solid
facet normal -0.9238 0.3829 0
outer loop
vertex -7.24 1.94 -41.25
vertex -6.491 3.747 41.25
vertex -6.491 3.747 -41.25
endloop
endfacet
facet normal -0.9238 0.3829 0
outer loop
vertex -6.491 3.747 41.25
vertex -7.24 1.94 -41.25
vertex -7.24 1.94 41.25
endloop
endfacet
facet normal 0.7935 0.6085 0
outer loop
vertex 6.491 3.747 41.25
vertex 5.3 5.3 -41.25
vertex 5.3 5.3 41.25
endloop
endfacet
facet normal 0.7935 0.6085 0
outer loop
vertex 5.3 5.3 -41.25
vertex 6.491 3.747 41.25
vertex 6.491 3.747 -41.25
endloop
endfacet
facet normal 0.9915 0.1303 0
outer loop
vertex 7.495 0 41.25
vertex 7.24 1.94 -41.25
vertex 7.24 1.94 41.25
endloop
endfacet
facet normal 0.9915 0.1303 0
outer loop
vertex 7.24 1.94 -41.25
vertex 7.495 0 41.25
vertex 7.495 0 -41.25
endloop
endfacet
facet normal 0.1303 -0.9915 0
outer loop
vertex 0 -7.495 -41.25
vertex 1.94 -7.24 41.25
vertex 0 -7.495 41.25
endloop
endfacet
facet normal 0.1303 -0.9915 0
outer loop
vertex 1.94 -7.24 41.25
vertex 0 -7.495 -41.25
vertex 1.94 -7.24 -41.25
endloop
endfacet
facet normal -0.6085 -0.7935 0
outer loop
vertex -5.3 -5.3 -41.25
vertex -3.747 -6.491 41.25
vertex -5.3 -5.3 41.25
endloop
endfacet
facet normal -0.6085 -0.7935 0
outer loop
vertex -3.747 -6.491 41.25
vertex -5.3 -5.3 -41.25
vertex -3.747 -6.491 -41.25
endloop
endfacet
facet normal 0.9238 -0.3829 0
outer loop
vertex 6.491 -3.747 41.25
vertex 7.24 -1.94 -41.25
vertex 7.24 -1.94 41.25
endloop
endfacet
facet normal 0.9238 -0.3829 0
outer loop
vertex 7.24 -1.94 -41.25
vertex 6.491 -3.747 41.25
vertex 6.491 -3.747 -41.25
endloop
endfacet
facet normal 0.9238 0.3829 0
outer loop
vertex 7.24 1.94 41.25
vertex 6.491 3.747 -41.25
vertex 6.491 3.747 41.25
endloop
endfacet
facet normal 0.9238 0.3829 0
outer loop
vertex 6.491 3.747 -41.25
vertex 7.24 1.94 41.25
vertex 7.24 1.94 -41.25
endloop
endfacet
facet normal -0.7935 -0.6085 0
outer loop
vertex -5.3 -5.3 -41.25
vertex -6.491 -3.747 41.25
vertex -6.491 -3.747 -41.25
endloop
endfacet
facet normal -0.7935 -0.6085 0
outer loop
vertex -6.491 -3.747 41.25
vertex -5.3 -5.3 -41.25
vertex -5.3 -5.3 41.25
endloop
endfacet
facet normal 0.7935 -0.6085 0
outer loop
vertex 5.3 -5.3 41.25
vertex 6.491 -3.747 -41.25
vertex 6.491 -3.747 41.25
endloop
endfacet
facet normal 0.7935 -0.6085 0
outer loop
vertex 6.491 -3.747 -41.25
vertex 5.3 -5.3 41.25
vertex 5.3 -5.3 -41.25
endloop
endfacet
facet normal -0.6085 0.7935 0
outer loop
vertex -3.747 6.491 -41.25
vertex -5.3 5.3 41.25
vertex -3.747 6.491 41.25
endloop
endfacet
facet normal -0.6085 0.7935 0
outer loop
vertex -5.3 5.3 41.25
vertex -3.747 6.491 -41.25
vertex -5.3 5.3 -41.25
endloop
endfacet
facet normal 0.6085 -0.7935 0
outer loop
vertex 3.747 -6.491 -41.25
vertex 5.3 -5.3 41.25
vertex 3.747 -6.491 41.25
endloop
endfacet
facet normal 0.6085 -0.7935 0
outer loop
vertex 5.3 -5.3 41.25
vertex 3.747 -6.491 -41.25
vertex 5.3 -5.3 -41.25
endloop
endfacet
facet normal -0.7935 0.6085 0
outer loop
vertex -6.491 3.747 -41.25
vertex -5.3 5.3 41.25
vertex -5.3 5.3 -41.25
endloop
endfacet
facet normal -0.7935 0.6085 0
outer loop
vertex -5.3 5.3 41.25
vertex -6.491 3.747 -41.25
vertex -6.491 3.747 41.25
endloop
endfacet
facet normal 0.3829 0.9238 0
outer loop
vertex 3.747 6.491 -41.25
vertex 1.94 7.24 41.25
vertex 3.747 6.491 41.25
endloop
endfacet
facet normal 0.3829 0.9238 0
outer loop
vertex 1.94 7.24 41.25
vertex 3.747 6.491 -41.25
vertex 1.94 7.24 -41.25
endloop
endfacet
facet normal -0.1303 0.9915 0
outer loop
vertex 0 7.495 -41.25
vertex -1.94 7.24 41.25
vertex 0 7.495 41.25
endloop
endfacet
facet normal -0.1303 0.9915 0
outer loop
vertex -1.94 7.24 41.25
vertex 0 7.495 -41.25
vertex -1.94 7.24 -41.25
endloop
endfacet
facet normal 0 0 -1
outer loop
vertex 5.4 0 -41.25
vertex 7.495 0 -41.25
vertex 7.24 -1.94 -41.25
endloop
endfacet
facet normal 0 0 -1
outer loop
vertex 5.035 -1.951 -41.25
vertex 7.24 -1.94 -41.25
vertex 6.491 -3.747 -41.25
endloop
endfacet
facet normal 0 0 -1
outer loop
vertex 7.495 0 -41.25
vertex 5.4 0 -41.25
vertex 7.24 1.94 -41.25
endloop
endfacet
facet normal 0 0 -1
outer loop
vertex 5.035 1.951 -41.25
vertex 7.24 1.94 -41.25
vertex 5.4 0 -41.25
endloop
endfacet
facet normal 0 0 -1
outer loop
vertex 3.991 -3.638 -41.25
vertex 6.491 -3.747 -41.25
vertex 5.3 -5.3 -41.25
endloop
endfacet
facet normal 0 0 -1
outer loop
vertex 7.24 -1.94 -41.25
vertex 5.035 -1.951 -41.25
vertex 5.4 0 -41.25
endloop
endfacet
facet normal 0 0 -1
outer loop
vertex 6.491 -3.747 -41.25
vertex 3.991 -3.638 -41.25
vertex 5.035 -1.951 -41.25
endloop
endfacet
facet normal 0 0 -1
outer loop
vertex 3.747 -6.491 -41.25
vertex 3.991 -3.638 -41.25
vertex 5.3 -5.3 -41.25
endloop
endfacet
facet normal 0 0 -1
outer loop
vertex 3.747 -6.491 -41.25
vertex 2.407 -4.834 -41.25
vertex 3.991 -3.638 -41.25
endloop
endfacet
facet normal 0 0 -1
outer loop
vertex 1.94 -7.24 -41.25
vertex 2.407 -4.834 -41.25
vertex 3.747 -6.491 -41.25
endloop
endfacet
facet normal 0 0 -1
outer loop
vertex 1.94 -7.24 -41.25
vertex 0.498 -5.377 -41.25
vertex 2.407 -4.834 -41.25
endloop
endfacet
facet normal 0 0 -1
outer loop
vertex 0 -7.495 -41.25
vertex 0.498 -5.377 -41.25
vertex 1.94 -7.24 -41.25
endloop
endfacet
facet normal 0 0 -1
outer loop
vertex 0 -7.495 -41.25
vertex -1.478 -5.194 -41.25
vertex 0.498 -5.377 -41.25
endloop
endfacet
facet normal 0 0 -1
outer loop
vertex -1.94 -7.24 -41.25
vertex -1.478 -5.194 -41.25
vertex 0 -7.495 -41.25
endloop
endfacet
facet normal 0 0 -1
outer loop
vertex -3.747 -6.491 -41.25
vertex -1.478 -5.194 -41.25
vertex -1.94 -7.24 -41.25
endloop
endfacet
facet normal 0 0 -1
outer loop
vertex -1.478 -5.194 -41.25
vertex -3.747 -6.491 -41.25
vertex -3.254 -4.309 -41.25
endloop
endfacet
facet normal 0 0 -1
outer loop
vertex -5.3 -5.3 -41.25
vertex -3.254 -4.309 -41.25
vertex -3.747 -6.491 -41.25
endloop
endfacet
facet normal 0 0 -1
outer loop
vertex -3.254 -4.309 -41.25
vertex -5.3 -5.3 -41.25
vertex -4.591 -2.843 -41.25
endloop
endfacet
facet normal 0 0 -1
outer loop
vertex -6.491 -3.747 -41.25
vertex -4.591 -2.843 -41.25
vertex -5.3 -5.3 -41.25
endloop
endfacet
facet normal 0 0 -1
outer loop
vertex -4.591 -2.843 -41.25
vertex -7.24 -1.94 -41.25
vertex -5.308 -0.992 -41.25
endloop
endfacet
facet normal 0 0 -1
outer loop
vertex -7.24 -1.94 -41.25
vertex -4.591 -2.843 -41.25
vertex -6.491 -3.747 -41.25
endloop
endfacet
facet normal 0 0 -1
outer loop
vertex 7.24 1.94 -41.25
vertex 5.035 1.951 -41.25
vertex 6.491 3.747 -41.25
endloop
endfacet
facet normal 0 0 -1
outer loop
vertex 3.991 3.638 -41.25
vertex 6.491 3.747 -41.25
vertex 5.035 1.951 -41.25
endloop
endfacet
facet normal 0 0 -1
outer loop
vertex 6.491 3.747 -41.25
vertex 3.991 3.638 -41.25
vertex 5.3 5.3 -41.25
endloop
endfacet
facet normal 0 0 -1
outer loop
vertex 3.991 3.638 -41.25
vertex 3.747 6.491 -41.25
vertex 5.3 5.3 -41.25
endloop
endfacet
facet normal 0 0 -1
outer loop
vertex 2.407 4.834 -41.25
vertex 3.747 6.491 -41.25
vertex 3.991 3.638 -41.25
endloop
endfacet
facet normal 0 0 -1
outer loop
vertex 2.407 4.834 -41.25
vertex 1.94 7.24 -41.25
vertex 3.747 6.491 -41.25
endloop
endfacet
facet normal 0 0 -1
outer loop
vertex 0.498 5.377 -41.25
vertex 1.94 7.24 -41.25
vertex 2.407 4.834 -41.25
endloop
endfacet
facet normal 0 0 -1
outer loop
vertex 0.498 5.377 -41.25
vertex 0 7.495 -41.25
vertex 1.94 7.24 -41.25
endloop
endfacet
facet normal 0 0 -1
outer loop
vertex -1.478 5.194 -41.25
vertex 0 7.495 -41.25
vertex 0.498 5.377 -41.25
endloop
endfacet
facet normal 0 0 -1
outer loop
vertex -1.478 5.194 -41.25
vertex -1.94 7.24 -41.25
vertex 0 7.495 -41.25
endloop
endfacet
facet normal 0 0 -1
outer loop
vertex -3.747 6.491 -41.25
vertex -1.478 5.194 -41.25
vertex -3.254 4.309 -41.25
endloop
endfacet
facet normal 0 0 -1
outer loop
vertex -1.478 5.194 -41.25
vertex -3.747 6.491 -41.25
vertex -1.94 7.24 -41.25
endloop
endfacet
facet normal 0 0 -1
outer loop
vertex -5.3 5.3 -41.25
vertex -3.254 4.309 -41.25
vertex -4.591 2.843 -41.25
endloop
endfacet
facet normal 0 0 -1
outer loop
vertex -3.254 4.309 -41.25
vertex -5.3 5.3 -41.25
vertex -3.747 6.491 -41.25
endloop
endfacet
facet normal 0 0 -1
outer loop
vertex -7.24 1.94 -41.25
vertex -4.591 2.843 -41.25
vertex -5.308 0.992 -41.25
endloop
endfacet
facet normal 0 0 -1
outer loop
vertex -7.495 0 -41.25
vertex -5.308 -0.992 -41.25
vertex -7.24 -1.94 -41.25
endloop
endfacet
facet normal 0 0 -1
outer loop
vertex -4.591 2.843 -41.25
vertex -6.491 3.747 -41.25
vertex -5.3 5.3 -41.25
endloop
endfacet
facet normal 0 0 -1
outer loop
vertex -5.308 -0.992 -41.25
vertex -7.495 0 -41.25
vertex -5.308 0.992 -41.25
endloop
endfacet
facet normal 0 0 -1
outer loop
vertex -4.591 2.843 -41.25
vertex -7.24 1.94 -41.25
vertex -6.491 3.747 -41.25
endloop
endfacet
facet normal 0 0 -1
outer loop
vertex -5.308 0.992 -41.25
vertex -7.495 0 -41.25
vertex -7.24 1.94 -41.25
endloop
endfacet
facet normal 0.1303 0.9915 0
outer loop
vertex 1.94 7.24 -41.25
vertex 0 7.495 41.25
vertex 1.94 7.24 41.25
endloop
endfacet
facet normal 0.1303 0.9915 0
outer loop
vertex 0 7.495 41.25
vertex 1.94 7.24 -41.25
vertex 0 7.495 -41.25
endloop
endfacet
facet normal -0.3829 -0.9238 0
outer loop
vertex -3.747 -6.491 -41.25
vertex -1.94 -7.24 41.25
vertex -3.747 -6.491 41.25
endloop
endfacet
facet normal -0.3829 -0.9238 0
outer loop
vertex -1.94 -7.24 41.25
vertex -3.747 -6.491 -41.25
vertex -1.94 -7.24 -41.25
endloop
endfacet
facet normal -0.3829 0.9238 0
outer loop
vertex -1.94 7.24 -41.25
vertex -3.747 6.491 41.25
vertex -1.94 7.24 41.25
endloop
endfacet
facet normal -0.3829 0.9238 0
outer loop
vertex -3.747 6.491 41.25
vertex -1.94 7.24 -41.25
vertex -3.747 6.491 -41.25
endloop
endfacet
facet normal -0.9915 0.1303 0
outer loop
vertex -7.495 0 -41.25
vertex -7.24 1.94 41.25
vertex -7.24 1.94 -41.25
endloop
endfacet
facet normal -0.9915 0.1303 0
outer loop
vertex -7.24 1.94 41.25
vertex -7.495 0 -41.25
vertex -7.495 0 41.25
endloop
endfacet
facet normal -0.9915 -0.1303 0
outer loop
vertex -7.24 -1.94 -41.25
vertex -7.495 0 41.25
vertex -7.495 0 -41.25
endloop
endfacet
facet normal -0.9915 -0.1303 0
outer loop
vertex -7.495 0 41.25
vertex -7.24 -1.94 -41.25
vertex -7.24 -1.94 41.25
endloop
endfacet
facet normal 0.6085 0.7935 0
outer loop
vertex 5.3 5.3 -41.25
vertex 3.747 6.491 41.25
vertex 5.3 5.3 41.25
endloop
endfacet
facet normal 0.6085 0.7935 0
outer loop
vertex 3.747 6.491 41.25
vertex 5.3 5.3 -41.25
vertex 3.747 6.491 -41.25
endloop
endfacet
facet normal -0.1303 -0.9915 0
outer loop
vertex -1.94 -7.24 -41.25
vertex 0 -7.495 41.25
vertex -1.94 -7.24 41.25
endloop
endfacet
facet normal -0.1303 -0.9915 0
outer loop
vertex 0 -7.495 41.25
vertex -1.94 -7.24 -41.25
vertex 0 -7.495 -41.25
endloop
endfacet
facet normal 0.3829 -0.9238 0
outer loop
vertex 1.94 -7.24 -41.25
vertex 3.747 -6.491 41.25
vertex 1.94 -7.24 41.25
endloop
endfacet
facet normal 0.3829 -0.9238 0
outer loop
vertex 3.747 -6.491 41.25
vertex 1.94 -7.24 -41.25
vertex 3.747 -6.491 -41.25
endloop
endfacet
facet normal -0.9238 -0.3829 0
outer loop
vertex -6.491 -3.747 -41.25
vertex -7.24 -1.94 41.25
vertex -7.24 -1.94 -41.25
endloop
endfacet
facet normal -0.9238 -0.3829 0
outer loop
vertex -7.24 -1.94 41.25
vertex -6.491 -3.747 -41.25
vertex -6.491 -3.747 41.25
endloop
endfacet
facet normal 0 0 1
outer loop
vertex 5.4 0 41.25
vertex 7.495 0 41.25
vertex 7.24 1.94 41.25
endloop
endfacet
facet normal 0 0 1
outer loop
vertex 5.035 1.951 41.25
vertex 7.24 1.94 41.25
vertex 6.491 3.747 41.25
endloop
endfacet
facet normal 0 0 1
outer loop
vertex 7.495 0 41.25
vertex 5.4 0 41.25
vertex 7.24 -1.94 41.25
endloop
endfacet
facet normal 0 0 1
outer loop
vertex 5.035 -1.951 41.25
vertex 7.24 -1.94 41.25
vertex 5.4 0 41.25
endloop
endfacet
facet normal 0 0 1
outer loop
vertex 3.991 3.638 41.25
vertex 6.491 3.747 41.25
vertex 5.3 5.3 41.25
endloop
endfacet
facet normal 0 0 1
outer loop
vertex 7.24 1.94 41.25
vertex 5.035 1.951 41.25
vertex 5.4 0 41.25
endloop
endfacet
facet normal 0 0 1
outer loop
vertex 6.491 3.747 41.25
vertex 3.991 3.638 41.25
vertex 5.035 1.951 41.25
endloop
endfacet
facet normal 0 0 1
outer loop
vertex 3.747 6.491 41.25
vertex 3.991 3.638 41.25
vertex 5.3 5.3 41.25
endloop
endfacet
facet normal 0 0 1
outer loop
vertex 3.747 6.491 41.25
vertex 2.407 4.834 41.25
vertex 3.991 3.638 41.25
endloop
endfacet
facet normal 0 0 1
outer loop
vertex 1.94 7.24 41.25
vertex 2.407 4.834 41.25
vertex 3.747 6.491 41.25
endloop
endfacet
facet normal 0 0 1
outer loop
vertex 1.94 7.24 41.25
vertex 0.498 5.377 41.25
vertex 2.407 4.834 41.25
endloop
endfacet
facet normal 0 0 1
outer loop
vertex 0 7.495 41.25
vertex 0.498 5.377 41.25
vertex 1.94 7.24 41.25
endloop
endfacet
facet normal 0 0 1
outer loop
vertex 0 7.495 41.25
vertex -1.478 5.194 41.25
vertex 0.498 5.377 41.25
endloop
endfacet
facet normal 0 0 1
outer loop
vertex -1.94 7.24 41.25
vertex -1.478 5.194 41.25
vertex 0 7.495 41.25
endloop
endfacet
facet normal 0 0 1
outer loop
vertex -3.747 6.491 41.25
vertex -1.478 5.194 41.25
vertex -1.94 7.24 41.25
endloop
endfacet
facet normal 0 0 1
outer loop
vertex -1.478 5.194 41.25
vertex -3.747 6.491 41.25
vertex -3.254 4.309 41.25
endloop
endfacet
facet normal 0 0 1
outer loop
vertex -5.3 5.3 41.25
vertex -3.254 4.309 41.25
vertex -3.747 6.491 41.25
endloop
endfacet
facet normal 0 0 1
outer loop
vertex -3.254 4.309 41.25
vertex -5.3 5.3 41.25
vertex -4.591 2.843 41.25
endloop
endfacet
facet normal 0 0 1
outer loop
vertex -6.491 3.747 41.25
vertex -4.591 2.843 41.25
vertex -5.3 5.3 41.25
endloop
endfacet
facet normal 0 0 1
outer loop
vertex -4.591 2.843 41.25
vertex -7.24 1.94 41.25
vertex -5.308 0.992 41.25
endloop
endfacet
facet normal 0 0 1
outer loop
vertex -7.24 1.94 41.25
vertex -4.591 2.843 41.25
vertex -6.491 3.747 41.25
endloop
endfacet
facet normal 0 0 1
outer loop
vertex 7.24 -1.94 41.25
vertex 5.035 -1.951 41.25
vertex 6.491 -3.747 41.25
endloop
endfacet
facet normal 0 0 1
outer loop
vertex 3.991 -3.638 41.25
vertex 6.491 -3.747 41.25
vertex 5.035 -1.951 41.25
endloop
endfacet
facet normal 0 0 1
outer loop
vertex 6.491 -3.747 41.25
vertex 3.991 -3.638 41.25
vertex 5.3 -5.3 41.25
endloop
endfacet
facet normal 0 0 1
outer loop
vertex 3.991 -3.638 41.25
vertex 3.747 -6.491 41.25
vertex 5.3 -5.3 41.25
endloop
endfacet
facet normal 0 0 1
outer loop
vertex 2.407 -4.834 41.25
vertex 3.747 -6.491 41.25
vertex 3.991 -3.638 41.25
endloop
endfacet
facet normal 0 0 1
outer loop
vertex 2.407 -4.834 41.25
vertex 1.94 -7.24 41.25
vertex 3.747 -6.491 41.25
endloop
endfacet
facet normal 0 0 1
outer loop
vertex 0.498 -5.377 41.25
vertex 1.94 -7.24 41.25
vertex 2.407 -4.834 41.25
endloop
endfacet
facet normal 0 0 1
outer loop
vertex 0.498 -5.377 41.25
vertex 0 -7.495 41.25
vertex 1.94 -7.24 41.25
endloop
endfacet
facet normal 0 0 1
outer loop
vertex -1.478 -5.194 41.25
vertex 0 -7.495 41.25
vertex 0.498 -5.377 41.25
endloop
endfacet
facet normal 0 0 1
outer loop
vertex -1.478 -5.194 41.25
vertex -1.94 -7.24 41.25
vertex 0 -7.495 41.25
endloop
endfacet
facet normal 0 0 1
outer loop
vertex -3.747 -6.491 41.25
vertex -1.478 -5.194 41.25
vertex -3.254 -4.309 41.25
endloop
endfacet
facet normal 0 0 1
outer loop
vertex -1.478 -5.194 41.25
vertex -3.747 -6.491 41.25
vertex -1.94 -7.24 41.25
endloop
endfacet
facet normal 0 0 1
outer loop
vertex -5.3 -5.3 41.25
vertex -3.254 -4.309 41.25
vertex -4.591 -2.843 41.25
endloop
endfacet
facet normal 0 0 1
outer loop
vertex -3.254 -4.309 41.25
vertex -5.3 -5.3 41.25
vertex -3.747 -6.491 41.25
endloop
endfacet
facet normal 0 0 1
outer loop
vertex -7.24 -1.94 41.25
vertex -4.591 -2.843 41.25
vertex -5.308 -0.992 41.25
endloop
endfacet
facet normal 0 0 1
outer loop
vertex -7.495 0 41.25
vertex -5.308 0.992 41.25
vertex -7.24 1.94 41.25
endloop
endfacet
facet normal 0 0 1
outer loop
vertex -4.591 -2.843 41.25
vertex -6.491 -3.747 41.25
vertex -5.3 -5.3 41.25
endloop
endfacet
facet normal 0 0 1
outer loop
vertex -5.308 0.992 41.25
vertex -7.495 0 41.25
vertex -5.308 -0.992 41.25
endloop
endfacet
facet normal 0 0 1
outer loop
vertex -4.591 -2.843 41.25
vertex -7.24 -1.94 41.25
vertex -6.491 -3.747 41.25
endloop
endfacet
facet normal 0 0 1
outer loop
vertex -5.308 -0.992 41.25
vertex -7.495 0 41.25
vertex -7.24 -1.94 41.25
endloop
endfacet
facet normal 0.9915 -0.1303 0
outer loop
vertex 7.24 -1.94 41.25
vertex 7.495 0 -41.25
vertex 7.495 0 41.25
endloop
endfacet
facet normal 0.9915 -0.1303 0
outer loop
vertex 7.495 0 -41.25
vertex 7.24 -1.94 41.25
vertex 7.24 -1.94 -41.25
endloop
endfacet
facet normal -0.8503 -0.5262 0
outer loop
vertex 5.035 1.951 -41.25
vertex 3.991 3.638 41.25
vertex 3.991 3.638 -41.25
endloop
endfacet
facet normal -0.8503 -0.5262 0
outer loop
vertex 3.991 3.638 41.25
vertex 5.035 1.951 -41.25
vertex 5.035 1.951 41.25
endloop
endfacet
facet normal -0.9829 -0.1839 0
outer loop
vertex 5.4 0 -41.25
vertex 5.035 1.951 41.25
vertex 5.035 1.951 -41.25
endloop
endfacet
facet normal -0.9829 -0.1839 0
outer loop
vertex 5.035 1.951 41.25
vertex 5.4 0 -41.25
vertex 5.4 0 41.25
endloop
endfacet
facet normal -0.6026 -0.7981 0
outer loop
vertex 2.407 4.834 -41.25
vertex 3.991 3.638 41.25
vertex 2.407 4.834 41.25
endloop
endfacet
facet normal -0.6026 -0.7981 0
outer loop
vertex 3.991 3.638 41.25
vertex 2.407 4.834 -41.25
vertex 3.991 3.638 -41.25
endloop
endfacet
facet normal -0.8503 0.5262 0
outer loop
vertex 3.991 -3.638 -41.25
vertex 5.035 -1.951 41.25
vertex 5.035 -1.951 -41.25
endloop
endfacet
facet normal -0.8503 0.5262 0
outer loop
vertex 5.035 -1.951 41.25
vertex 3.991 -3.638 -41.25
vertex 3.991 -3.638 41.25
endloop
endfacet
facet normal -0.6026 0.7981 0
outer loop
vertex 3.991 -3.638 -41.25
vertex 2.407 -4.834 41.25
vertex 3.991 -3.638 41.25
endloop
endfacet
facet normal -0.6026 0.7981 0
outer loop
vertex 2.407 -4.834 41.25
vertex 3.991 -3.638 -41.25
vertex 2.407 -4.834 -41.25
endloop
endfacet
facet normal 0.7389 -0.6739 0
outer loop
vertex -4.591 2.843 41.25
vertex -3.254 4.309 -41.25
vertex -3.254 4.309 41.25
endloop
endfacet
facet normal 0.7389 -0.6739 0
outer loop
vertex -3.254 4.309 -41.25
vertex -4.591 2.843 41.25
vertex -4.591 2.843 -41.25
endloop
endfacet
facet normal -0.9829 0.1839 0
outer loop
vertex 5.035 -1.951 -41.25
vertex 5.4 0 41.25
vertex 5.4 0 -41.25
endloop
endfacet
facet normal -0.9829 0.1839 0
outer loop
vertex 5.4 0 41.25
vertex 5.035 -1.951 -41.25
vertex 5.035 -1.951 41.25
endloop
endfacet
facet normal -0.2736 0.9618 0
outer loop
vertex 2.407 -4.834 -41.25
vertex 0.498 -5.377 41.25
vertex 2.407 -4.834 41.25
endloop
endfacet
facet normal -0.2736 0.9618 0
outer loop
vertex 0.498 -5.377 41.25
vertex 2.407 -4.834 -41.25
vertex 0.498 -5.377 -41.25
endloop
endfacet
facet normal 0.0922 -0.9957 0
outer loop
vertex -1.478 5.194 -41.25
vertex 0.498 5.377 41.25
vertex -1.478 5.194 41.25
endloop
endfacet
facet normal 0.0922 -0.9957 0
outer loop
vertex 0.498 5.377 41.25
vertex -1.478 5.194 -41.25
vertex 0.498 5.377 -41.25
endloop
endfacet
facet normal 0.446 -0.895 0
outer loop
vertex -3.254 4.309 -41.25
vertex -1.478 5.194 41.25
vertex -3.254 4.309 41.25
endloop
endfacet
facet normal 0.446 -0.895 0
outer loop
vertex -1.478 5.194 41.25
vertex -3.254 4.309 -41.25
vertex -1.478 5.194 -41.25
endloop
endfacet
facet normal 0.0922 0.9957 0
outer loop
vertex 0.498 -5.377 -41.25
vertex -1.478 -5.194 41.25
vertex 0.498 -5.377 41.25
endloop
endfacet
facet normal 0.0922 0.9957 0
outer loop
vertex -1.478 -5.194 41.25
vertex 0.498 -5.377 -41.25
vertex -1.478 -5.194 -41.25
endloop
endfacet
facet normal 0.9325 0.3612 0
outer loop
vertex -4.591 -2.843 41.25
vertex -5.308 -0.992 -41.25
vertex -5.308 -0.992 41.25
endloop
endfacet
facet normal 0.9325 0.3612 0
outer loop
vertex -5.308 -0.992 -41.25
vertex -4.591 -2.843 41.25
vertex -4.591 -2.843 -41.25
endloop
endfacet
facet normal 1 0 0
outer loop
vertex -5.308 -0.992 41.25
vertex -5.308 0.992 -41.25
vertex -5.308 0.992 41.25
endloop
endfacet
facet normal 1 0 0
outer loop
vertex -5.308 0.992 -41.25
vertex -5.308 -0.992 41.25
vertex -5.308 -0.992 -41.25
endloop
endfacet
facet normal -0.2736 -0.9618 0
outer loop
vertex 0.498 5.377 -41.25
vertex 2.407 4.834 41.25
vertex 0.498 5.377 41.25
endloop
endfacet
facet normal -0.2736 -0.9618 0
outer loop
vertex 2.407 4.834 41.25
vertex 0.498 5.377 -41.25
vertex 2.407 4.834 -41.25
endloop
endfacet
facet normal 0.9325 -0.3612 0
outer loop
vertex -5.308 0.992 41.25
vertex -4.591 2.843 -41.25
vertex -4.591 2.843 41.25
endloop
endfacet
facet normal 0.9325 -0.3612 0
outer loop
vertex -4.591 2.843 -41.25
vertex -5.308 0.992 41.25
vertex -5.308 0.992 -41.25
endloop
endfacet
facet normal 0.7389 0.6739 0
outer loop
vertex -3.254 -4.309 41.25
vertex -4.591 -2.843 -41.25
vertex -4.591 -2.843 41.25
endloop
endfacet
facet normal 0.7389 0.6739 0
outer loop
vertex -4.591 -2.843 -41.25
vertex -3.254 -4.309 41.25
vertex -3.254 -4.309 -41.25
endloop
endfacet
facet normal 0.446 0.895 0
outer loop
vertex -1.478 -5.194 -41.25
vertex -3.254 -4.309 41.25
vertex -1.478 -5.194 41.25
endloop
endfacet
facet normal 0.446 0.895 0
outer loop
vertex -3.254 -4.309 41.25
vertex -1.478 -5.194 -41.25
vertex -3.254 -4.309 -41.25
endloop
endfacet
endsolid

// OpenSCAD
// Parameters
L = 82.5; //[41.25:165:0.1]
OD = 14.99; //[7.5:29.98:0.01]
ID = 10.8; //[5.4:14.5:0.01]
overlap = 1; //[0.5:2:0.1]
chamfer = 0; //[0:1:0.1]
fillet = 0; //[0:1:0.1]
marking_depth = 0; //[0:0.5:0.05]

// Geometry
module outer_cylinder_body() {
  translate([0, 0, 0])
    cylinder(h = L, r = OD / 2, center = true);
}

module concentric_through_bore() {
  translate([0, 0, 0])
    cylinder(h = L + 2 * overlap, r = ID / 2, center = true);
}

// Main tube with through-bore
module tube_main() {
  difference() {
    outer_cylinder_body();
    concentric_through_bore();
  }
}

// Final model
module complete_model() {
  tube_main();
}

// Render the final output
color([0.85, 0.85, 0.8]) // Off-white for 3D printed PLA
complete_model();
